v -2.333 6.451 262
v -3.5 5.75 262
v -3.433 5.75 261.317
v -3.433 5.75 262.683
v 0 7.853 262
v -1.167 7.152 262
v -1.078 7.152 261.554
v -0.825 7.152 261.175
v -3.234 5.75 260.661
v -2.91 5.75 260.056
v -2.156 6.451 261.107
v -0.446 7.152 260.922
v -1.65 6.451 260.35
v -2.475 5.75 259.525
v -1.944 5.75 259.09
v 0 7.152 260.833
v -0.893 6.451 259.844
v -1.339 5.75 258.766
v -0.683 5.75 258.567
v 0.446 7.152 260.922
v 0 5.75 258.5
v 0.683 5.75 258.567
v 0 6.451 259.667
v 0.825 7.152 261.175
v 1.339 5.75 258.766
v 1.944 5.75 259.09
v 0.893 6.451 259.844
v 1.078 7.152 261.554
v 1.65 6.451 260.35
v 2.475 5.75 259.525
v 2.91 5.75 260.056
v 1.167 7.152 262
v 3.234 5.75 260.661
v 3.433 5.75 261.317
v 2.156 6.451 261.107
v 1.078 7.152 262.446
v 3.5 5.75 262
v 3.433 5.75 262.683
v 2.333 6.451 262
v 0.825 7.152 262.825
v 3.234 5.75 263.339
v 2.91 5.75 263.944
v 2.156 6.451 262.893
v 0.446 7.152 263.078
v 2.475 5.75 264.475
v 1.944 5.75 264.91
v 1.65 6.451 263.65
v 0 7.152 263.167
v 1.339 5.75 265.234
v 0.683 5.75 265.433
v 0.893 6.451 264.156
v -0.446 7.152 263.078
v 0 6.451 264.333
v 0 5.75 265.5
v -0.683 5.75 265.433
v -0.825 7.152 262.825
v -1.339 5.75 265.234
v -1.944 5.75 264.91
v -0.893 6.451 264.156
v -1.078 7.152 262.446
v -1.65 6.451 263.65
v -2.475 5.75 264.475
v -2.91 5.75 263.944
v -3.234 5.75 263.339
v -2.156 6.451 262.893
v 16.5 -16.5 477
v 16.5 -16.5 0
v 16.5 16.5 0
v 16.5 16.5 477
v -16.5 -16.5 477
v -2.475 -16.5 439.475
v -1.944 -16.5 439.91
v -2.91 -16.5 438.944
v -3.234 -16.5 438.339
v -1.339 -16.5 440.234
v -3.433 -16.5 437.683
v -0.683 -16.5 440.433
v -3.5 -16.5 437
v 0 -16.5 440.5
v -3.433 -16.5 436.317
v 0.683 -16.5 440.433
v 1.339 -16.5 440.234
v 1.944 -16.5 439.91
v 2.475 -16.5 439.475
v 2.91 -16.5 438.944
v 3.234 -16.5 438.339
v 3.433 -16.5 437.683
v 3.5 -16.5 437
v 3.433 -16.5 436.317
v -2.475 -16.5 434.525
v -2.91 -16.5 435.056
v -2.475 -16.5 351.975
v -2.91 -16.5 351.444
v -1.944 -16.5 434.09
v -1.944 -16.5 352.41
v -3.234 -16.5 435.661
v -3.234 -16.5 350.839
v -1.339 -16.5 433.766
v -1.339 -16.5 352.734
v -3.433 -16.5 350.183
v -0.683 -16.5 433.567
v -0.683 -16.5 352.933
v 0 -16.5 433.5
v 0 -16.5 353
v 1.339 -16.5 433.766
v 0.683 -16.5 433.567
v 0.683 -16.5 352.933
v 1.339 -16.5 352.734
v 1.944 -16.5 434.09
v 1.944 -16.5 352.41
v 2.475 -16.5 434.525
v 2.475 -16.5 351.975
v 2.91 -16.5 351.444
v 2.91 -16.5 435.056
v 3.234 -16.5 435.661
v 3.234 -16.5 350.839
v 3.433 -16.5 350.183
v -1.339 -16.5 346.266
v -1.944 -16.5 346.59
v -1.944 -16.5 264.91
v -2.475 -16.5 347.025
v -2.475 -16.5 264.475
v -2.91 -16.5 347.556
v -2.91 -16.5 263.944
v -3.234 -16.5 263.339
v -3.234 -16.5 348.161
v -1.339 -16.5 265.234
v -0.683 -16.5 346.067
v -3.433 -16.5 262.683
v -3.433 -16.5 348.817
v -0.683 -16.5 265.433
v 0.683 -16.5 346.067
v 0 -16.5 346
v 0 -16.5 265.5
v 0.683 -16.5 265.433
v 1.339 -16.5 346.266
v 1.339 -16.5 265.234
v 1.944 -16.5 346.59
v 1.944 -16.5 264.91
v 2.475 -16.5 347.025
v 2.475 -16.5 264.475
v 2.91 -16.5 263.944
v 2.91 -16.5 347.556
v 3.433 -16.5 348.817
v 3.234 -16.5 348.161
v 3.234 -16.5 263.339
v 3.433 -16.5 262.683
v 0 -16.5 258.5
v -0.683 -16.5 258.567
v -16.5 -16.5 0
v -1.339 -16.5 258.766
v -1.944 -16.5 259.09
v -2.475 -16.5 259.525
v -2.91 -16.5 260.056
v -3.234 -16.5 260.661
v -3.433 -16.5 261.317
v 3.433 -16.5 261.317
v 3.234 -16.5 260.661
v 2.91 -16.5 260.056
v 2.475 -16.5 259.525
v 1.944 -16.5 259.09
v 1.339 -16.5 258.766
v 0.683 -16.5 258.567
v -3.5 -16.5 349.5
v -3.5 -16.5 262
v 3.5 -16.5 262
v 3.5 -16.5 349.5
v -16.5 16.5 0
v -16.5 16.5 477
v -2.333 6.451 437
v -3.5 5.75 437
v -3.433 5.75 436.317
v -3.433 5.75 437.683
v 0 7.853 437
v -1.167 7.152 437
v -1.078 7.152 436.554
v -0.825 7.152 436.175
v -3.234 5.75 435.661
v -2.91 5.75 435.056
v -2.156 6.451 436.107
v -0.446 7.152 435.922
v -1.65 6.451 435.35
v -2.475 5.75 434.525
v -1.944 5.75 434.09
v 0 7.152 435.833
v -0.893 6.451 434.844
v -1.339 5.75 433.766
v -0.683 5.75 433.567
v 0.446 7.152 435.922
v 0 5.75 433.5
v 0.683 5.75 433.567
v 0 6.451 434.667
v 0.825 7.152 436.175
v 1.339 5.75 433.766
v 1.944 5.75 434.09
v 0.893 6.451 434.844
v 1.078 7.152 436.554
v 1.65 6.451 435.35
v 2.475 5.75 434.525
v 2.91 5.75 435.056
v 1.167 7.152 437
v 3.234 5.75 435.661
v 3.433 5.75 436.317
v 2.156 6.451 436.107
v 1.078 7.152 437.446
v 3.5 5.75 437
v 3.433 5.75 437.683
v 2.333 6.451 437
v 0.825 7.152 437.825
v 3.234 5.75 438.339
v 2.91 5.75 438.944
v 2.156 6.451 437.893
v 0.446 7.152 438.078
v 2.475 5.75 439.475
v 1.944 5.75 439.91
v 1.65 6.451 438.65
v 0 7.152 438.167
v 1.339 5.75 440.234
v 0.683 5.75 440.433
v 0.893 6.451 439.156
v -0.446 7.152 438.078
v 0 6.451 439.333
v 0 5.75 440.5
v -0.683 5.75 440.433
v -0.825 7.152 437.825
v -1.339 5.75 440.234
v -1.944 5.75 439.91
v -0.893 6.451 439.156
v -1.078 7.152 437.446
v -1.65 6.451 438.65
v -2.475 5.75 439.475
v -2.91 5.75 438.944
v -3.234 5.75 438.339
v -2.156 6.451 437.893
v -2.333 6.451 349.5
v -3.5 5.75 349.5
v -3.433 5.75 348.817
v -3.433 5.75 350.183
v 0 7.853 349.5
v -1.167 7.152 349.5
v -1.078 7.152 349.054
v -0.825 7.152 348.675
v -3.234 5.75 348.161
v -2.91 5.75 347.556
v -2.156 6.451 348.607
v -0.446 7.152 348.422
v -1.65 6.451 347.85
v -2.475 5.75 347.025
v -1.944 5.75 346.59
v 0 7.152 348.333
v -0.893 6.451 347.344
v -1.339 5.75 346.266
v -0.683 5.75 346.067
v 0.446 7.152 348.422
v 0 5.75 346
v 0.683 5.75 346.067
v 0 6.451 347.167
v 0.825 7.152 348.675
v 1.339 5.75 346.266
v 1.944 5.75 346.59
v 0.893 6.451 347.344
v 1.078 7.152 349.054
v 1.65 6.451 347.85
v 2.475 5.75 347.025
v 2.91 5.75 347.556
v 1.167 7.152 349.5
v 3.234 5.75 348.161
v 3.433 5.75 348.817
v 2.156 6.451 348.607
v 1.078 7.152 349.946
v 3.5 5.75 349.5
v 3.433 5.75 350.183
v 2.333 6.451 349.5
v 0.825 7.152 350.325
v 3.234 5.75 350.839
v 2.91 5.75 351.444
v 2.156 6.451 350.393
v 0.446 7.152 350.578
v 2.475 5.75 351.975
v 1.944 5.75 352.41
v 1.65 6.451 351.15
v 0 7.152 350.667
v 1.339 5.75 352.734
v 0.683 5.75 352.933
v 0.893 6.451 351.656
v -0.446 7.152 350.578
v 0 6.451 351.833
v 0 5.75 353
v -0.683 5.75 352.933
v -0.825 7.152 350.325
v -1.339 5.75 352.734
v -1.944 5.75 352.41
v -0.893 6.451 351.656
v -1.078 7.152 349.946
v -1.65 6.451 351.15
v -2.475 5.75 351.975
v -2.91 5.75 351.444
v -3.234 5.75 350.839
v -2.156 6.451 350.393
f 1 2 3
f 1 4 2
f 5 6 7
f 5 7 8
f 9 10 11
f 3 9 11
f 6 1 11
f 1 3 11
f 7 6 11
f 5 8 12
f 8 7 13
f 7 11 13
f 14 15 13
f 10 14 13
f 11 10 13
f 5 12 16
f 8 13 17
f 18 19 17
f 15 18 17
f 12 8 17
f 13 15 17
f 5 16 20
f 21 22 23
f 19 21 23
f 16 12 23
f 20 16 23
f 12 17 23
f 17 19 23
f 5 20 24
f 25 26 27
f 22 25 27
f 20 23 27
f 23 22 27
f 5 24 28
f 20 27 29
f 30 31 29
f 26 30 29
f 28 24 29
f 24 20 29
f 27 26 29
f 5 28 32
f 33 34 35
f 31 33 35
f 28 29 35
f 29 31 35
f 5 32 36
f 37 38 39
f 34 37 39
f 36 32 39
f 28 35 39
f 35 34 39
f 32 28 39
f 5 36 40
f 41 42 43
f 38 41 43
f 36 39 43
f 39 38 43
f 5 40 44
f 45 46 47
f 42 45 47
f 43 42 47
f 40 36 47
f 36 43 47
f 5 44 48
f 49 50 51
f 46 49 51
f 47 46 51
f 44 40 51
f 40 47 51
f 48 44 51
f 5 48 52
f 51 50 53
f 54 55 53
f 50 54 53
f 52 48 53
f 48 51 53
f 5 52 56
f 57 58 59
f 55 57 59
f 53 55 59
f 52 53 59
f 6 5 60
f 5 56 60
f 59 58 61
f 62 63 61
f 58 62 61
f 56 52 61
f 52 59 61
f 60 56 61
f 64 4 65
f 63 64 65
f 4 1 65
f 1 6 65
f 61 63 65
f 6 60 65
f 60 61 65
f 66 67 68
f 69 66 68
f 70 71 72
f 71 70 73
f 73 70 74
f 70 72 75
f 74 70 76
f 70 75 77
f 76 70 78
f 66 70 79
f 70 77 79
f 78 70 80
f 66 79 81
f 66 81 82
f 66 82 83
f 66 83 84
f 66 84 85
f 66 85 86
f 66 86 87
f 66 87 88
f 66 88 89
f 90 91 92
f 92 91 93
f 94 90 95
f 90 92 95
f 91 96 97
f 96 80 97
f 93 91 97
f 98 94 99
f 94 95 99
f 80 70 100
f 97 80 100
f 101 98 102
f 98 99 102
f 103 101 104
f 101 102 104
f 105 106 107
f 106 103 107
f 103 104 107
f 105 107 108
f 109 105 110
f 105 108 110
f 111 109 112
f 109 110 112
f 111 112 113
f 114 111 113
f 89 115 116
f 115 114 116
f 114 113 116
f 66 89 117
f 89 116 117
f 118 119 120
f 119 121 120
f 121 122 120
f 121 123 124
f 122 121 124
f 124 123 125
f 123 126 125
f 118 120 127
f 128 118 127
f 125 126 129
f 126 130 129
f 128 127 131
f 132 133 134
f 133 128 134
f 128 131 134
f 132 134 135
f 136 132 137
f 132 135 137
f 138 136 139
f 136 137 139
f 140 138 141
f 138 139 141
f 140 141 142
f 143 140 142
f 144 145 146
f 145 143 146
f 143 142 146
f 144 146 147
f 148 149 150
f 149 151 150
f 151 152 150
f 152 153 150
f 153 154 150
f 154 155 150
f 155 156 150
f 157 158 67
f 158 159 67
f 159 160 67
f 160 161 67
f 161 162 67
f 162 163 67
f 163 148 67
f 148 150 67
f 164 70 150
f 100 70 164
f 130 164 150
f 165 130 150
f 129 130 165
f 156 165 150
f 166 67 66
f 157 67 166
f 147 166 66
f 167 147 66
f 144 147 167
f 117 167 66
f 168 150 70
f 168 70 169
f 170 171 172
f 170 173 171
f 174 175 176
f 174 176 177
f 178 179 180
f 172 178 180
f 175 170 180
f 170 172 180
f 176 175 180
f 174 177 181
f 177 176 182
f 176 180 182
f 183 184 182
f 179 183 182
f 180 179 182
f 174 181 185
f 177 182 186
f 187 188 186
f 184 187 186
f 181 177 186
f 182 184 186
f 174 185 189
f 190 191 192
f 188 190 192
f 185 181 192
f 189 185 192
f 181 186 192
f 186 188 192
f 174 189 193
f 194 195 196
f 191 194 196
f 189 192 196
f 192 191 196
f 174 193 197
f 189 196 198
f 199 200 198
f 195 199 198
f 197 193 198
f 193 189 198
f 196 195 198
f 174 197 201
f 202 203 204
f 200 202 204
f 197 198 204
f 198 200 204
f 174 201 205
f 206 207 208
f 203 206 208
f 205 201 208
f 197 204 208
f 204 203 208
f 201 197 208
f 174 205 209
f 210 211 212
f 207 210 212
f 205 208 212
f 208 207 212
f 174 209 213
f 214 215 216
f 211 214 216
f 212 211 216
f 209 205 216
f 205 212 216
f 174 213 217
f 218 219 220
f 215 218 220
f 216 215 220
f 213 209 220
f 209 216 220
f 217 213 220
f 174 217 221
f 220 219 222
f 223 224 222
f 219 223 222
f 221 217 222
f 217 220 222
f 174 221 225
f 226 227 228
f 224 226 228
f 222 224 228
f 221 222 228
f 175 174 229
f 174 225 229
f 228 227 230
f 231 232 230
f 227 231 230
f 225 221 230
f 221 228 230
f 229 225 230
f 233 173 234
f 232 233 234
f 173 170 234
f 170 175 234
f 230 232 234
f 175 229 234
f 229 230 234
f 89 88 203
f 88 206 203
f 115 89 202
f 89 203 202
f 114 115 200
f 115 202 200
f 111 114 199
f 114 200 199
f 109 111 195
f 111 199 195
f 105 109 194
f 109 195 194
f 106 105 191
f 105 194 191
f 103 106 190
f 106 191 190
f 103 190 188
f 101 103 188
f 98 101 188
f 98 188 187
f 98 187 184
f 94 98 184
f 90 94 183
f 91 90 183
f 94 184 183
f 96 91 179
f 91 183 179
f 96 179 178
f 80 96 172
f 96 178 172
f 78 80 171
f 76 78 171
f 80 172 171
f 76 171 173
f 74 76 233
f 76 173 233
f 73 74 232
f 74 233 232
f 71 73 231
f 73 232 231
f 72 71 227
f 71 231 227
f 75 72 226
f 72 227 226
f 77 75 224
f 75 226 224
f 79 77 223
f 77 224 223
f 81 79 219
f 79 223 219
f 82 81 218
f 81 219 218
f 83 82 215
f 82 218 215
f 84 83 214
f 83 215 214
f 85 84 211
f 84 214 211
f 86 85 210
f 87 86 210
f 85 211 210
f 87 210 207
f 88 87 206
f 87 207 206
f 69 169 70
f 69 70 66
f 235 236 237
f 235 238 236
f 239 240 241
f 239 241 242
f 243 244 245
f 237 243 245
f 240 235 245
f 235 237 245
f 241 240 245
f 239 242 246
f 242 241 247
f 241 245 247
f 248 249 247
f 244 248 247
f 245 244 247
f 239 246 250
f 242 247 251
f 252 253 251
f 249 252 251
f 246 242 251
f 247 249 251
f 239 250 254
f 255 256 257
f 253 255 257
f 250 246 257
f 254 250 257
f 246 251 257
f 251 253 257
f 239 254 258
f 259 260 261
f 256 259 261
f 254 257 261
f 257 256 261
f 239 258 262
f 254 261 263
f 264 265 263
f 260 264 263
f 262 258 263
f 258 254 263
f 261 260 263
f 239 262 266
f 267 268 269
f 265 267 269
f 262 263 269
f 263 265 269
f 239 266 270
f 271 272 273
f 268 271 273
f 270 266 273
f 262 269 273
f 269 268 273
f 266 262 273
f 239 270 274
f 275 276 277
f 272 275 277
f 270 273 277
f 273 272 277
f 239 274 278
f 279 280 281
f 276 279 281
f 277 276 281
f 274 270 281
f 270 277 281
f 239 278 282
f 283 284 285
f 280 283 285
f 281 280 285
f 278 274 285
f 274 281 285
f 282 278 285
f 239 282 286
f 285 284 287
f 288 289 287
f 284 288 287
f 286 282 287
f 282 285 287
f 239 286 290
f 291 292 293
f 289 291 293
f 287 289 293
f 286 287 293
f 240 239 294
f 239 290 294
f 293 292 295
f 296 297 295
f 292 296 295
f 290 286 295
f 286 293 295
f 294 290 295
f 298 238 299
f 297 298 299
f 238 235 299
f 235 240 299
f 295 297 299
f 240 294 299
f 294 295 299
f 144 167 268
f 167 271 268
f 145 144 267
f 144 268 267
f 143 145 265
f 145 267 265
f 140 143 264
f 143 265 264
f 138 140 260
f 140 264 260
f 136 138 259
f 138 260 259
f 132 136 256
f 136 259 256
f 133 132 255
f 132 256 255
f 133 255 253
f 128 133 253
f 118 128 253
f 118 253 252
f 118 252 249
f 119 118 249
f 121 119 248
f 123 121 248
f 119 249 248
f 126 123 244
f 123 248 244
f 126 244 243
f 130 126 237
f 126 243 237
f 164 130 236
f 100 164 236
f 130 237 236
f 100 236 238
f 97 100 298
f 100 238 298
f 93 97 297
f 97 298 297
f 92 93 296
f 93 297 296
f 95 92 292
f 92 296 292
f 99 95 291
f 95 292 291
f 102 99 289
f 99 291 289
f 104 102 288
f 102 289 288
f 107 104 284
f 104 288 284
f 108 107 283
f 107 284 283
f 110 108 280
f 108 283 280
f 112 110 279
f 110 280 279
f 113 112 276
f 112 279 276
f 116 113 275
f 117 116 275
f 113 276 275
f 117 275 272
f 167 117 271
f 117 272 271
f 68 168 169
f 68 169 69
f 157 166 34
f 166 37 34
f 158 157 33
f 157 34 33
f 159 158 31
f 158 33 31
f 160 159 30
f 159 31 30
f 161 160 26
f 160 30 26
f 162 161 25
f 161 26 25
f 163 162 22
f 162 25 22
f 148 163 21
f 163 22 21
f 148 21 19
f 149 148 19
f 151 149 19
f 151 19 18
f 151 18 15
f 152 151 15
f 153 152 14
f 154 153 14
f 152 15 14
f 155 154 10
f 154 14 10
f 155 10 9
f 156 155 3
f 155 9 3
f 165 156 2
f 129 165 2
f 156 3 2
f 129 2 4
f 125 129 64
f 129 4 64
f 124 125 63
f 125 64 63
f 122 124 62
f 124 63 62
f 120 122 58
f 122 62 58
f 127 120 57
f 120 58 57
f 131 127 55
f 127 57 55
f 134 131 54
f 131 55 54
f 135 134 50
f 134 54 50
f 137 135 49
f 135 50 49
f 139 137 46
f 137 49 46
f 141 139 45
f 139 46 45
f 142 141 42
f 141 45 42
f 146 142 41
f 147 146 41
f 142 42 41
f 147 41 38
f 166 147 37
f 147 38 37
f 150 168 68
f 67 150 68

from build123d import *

# Parameters (mm, degrees)
SKIZZE1_W                          = 33
SKIZZE1_H                          = 33
AUFSATZ_LINEAR_AUSTRAGEN1_DEPTH    = 477
F_7_0_7_DURCHMESSER_BOHRUNG1_D     = 7
F_7_0_7_DURCHMESSER_BOHRUNG1_DEPTH = 22.25
F_7_0_7_DURCHMESSER_BOHRUNG1_TIP   = 2.103012167


with BuildPart() as part:
    # Skizze1 → Aufsatz-Linear austragen1 (new body)
    with BuildSketch(Plane.XY):
        Rectangle(SKIZZE1_W, SKIZZE1_H)
    extrude(amount=AUFSATZ_LINEAR_AUSTRAGEN1_DEPTH)

    # Ø7.0 (7) Durchmesser Bohrung1
    with Locations(Plane(origin=(0, -16.5, 0), x_dir=(-1, 0, 0), z_dir=(0, -1, 0))):
        with Locations((0, -437), (0, -349.5), (0, -262)):
            Hole(F_7_0_7_DURCHMESSER_BOHRUNG1_D / 2, depth=F_7_0_7_DURCHMESSER_BOHRUNG1_DEPTH)
            with Locations((0, 0, -(F_7_0_7_DURCHMESSER_BOHRUNG1_DEPTH + F_7_0_7_DURCHMESSER_BOHRUNG1_TIP / 2))):  # 118° drill point
                Cone(0, F_7_0_7_DURCHMESSER_BOHRUNG1_D / 2, F_7_0_7_DURCHMESSER_BOHRUNG1_TIP, mode=Mode.SUBTRACT)


solid = part.part
